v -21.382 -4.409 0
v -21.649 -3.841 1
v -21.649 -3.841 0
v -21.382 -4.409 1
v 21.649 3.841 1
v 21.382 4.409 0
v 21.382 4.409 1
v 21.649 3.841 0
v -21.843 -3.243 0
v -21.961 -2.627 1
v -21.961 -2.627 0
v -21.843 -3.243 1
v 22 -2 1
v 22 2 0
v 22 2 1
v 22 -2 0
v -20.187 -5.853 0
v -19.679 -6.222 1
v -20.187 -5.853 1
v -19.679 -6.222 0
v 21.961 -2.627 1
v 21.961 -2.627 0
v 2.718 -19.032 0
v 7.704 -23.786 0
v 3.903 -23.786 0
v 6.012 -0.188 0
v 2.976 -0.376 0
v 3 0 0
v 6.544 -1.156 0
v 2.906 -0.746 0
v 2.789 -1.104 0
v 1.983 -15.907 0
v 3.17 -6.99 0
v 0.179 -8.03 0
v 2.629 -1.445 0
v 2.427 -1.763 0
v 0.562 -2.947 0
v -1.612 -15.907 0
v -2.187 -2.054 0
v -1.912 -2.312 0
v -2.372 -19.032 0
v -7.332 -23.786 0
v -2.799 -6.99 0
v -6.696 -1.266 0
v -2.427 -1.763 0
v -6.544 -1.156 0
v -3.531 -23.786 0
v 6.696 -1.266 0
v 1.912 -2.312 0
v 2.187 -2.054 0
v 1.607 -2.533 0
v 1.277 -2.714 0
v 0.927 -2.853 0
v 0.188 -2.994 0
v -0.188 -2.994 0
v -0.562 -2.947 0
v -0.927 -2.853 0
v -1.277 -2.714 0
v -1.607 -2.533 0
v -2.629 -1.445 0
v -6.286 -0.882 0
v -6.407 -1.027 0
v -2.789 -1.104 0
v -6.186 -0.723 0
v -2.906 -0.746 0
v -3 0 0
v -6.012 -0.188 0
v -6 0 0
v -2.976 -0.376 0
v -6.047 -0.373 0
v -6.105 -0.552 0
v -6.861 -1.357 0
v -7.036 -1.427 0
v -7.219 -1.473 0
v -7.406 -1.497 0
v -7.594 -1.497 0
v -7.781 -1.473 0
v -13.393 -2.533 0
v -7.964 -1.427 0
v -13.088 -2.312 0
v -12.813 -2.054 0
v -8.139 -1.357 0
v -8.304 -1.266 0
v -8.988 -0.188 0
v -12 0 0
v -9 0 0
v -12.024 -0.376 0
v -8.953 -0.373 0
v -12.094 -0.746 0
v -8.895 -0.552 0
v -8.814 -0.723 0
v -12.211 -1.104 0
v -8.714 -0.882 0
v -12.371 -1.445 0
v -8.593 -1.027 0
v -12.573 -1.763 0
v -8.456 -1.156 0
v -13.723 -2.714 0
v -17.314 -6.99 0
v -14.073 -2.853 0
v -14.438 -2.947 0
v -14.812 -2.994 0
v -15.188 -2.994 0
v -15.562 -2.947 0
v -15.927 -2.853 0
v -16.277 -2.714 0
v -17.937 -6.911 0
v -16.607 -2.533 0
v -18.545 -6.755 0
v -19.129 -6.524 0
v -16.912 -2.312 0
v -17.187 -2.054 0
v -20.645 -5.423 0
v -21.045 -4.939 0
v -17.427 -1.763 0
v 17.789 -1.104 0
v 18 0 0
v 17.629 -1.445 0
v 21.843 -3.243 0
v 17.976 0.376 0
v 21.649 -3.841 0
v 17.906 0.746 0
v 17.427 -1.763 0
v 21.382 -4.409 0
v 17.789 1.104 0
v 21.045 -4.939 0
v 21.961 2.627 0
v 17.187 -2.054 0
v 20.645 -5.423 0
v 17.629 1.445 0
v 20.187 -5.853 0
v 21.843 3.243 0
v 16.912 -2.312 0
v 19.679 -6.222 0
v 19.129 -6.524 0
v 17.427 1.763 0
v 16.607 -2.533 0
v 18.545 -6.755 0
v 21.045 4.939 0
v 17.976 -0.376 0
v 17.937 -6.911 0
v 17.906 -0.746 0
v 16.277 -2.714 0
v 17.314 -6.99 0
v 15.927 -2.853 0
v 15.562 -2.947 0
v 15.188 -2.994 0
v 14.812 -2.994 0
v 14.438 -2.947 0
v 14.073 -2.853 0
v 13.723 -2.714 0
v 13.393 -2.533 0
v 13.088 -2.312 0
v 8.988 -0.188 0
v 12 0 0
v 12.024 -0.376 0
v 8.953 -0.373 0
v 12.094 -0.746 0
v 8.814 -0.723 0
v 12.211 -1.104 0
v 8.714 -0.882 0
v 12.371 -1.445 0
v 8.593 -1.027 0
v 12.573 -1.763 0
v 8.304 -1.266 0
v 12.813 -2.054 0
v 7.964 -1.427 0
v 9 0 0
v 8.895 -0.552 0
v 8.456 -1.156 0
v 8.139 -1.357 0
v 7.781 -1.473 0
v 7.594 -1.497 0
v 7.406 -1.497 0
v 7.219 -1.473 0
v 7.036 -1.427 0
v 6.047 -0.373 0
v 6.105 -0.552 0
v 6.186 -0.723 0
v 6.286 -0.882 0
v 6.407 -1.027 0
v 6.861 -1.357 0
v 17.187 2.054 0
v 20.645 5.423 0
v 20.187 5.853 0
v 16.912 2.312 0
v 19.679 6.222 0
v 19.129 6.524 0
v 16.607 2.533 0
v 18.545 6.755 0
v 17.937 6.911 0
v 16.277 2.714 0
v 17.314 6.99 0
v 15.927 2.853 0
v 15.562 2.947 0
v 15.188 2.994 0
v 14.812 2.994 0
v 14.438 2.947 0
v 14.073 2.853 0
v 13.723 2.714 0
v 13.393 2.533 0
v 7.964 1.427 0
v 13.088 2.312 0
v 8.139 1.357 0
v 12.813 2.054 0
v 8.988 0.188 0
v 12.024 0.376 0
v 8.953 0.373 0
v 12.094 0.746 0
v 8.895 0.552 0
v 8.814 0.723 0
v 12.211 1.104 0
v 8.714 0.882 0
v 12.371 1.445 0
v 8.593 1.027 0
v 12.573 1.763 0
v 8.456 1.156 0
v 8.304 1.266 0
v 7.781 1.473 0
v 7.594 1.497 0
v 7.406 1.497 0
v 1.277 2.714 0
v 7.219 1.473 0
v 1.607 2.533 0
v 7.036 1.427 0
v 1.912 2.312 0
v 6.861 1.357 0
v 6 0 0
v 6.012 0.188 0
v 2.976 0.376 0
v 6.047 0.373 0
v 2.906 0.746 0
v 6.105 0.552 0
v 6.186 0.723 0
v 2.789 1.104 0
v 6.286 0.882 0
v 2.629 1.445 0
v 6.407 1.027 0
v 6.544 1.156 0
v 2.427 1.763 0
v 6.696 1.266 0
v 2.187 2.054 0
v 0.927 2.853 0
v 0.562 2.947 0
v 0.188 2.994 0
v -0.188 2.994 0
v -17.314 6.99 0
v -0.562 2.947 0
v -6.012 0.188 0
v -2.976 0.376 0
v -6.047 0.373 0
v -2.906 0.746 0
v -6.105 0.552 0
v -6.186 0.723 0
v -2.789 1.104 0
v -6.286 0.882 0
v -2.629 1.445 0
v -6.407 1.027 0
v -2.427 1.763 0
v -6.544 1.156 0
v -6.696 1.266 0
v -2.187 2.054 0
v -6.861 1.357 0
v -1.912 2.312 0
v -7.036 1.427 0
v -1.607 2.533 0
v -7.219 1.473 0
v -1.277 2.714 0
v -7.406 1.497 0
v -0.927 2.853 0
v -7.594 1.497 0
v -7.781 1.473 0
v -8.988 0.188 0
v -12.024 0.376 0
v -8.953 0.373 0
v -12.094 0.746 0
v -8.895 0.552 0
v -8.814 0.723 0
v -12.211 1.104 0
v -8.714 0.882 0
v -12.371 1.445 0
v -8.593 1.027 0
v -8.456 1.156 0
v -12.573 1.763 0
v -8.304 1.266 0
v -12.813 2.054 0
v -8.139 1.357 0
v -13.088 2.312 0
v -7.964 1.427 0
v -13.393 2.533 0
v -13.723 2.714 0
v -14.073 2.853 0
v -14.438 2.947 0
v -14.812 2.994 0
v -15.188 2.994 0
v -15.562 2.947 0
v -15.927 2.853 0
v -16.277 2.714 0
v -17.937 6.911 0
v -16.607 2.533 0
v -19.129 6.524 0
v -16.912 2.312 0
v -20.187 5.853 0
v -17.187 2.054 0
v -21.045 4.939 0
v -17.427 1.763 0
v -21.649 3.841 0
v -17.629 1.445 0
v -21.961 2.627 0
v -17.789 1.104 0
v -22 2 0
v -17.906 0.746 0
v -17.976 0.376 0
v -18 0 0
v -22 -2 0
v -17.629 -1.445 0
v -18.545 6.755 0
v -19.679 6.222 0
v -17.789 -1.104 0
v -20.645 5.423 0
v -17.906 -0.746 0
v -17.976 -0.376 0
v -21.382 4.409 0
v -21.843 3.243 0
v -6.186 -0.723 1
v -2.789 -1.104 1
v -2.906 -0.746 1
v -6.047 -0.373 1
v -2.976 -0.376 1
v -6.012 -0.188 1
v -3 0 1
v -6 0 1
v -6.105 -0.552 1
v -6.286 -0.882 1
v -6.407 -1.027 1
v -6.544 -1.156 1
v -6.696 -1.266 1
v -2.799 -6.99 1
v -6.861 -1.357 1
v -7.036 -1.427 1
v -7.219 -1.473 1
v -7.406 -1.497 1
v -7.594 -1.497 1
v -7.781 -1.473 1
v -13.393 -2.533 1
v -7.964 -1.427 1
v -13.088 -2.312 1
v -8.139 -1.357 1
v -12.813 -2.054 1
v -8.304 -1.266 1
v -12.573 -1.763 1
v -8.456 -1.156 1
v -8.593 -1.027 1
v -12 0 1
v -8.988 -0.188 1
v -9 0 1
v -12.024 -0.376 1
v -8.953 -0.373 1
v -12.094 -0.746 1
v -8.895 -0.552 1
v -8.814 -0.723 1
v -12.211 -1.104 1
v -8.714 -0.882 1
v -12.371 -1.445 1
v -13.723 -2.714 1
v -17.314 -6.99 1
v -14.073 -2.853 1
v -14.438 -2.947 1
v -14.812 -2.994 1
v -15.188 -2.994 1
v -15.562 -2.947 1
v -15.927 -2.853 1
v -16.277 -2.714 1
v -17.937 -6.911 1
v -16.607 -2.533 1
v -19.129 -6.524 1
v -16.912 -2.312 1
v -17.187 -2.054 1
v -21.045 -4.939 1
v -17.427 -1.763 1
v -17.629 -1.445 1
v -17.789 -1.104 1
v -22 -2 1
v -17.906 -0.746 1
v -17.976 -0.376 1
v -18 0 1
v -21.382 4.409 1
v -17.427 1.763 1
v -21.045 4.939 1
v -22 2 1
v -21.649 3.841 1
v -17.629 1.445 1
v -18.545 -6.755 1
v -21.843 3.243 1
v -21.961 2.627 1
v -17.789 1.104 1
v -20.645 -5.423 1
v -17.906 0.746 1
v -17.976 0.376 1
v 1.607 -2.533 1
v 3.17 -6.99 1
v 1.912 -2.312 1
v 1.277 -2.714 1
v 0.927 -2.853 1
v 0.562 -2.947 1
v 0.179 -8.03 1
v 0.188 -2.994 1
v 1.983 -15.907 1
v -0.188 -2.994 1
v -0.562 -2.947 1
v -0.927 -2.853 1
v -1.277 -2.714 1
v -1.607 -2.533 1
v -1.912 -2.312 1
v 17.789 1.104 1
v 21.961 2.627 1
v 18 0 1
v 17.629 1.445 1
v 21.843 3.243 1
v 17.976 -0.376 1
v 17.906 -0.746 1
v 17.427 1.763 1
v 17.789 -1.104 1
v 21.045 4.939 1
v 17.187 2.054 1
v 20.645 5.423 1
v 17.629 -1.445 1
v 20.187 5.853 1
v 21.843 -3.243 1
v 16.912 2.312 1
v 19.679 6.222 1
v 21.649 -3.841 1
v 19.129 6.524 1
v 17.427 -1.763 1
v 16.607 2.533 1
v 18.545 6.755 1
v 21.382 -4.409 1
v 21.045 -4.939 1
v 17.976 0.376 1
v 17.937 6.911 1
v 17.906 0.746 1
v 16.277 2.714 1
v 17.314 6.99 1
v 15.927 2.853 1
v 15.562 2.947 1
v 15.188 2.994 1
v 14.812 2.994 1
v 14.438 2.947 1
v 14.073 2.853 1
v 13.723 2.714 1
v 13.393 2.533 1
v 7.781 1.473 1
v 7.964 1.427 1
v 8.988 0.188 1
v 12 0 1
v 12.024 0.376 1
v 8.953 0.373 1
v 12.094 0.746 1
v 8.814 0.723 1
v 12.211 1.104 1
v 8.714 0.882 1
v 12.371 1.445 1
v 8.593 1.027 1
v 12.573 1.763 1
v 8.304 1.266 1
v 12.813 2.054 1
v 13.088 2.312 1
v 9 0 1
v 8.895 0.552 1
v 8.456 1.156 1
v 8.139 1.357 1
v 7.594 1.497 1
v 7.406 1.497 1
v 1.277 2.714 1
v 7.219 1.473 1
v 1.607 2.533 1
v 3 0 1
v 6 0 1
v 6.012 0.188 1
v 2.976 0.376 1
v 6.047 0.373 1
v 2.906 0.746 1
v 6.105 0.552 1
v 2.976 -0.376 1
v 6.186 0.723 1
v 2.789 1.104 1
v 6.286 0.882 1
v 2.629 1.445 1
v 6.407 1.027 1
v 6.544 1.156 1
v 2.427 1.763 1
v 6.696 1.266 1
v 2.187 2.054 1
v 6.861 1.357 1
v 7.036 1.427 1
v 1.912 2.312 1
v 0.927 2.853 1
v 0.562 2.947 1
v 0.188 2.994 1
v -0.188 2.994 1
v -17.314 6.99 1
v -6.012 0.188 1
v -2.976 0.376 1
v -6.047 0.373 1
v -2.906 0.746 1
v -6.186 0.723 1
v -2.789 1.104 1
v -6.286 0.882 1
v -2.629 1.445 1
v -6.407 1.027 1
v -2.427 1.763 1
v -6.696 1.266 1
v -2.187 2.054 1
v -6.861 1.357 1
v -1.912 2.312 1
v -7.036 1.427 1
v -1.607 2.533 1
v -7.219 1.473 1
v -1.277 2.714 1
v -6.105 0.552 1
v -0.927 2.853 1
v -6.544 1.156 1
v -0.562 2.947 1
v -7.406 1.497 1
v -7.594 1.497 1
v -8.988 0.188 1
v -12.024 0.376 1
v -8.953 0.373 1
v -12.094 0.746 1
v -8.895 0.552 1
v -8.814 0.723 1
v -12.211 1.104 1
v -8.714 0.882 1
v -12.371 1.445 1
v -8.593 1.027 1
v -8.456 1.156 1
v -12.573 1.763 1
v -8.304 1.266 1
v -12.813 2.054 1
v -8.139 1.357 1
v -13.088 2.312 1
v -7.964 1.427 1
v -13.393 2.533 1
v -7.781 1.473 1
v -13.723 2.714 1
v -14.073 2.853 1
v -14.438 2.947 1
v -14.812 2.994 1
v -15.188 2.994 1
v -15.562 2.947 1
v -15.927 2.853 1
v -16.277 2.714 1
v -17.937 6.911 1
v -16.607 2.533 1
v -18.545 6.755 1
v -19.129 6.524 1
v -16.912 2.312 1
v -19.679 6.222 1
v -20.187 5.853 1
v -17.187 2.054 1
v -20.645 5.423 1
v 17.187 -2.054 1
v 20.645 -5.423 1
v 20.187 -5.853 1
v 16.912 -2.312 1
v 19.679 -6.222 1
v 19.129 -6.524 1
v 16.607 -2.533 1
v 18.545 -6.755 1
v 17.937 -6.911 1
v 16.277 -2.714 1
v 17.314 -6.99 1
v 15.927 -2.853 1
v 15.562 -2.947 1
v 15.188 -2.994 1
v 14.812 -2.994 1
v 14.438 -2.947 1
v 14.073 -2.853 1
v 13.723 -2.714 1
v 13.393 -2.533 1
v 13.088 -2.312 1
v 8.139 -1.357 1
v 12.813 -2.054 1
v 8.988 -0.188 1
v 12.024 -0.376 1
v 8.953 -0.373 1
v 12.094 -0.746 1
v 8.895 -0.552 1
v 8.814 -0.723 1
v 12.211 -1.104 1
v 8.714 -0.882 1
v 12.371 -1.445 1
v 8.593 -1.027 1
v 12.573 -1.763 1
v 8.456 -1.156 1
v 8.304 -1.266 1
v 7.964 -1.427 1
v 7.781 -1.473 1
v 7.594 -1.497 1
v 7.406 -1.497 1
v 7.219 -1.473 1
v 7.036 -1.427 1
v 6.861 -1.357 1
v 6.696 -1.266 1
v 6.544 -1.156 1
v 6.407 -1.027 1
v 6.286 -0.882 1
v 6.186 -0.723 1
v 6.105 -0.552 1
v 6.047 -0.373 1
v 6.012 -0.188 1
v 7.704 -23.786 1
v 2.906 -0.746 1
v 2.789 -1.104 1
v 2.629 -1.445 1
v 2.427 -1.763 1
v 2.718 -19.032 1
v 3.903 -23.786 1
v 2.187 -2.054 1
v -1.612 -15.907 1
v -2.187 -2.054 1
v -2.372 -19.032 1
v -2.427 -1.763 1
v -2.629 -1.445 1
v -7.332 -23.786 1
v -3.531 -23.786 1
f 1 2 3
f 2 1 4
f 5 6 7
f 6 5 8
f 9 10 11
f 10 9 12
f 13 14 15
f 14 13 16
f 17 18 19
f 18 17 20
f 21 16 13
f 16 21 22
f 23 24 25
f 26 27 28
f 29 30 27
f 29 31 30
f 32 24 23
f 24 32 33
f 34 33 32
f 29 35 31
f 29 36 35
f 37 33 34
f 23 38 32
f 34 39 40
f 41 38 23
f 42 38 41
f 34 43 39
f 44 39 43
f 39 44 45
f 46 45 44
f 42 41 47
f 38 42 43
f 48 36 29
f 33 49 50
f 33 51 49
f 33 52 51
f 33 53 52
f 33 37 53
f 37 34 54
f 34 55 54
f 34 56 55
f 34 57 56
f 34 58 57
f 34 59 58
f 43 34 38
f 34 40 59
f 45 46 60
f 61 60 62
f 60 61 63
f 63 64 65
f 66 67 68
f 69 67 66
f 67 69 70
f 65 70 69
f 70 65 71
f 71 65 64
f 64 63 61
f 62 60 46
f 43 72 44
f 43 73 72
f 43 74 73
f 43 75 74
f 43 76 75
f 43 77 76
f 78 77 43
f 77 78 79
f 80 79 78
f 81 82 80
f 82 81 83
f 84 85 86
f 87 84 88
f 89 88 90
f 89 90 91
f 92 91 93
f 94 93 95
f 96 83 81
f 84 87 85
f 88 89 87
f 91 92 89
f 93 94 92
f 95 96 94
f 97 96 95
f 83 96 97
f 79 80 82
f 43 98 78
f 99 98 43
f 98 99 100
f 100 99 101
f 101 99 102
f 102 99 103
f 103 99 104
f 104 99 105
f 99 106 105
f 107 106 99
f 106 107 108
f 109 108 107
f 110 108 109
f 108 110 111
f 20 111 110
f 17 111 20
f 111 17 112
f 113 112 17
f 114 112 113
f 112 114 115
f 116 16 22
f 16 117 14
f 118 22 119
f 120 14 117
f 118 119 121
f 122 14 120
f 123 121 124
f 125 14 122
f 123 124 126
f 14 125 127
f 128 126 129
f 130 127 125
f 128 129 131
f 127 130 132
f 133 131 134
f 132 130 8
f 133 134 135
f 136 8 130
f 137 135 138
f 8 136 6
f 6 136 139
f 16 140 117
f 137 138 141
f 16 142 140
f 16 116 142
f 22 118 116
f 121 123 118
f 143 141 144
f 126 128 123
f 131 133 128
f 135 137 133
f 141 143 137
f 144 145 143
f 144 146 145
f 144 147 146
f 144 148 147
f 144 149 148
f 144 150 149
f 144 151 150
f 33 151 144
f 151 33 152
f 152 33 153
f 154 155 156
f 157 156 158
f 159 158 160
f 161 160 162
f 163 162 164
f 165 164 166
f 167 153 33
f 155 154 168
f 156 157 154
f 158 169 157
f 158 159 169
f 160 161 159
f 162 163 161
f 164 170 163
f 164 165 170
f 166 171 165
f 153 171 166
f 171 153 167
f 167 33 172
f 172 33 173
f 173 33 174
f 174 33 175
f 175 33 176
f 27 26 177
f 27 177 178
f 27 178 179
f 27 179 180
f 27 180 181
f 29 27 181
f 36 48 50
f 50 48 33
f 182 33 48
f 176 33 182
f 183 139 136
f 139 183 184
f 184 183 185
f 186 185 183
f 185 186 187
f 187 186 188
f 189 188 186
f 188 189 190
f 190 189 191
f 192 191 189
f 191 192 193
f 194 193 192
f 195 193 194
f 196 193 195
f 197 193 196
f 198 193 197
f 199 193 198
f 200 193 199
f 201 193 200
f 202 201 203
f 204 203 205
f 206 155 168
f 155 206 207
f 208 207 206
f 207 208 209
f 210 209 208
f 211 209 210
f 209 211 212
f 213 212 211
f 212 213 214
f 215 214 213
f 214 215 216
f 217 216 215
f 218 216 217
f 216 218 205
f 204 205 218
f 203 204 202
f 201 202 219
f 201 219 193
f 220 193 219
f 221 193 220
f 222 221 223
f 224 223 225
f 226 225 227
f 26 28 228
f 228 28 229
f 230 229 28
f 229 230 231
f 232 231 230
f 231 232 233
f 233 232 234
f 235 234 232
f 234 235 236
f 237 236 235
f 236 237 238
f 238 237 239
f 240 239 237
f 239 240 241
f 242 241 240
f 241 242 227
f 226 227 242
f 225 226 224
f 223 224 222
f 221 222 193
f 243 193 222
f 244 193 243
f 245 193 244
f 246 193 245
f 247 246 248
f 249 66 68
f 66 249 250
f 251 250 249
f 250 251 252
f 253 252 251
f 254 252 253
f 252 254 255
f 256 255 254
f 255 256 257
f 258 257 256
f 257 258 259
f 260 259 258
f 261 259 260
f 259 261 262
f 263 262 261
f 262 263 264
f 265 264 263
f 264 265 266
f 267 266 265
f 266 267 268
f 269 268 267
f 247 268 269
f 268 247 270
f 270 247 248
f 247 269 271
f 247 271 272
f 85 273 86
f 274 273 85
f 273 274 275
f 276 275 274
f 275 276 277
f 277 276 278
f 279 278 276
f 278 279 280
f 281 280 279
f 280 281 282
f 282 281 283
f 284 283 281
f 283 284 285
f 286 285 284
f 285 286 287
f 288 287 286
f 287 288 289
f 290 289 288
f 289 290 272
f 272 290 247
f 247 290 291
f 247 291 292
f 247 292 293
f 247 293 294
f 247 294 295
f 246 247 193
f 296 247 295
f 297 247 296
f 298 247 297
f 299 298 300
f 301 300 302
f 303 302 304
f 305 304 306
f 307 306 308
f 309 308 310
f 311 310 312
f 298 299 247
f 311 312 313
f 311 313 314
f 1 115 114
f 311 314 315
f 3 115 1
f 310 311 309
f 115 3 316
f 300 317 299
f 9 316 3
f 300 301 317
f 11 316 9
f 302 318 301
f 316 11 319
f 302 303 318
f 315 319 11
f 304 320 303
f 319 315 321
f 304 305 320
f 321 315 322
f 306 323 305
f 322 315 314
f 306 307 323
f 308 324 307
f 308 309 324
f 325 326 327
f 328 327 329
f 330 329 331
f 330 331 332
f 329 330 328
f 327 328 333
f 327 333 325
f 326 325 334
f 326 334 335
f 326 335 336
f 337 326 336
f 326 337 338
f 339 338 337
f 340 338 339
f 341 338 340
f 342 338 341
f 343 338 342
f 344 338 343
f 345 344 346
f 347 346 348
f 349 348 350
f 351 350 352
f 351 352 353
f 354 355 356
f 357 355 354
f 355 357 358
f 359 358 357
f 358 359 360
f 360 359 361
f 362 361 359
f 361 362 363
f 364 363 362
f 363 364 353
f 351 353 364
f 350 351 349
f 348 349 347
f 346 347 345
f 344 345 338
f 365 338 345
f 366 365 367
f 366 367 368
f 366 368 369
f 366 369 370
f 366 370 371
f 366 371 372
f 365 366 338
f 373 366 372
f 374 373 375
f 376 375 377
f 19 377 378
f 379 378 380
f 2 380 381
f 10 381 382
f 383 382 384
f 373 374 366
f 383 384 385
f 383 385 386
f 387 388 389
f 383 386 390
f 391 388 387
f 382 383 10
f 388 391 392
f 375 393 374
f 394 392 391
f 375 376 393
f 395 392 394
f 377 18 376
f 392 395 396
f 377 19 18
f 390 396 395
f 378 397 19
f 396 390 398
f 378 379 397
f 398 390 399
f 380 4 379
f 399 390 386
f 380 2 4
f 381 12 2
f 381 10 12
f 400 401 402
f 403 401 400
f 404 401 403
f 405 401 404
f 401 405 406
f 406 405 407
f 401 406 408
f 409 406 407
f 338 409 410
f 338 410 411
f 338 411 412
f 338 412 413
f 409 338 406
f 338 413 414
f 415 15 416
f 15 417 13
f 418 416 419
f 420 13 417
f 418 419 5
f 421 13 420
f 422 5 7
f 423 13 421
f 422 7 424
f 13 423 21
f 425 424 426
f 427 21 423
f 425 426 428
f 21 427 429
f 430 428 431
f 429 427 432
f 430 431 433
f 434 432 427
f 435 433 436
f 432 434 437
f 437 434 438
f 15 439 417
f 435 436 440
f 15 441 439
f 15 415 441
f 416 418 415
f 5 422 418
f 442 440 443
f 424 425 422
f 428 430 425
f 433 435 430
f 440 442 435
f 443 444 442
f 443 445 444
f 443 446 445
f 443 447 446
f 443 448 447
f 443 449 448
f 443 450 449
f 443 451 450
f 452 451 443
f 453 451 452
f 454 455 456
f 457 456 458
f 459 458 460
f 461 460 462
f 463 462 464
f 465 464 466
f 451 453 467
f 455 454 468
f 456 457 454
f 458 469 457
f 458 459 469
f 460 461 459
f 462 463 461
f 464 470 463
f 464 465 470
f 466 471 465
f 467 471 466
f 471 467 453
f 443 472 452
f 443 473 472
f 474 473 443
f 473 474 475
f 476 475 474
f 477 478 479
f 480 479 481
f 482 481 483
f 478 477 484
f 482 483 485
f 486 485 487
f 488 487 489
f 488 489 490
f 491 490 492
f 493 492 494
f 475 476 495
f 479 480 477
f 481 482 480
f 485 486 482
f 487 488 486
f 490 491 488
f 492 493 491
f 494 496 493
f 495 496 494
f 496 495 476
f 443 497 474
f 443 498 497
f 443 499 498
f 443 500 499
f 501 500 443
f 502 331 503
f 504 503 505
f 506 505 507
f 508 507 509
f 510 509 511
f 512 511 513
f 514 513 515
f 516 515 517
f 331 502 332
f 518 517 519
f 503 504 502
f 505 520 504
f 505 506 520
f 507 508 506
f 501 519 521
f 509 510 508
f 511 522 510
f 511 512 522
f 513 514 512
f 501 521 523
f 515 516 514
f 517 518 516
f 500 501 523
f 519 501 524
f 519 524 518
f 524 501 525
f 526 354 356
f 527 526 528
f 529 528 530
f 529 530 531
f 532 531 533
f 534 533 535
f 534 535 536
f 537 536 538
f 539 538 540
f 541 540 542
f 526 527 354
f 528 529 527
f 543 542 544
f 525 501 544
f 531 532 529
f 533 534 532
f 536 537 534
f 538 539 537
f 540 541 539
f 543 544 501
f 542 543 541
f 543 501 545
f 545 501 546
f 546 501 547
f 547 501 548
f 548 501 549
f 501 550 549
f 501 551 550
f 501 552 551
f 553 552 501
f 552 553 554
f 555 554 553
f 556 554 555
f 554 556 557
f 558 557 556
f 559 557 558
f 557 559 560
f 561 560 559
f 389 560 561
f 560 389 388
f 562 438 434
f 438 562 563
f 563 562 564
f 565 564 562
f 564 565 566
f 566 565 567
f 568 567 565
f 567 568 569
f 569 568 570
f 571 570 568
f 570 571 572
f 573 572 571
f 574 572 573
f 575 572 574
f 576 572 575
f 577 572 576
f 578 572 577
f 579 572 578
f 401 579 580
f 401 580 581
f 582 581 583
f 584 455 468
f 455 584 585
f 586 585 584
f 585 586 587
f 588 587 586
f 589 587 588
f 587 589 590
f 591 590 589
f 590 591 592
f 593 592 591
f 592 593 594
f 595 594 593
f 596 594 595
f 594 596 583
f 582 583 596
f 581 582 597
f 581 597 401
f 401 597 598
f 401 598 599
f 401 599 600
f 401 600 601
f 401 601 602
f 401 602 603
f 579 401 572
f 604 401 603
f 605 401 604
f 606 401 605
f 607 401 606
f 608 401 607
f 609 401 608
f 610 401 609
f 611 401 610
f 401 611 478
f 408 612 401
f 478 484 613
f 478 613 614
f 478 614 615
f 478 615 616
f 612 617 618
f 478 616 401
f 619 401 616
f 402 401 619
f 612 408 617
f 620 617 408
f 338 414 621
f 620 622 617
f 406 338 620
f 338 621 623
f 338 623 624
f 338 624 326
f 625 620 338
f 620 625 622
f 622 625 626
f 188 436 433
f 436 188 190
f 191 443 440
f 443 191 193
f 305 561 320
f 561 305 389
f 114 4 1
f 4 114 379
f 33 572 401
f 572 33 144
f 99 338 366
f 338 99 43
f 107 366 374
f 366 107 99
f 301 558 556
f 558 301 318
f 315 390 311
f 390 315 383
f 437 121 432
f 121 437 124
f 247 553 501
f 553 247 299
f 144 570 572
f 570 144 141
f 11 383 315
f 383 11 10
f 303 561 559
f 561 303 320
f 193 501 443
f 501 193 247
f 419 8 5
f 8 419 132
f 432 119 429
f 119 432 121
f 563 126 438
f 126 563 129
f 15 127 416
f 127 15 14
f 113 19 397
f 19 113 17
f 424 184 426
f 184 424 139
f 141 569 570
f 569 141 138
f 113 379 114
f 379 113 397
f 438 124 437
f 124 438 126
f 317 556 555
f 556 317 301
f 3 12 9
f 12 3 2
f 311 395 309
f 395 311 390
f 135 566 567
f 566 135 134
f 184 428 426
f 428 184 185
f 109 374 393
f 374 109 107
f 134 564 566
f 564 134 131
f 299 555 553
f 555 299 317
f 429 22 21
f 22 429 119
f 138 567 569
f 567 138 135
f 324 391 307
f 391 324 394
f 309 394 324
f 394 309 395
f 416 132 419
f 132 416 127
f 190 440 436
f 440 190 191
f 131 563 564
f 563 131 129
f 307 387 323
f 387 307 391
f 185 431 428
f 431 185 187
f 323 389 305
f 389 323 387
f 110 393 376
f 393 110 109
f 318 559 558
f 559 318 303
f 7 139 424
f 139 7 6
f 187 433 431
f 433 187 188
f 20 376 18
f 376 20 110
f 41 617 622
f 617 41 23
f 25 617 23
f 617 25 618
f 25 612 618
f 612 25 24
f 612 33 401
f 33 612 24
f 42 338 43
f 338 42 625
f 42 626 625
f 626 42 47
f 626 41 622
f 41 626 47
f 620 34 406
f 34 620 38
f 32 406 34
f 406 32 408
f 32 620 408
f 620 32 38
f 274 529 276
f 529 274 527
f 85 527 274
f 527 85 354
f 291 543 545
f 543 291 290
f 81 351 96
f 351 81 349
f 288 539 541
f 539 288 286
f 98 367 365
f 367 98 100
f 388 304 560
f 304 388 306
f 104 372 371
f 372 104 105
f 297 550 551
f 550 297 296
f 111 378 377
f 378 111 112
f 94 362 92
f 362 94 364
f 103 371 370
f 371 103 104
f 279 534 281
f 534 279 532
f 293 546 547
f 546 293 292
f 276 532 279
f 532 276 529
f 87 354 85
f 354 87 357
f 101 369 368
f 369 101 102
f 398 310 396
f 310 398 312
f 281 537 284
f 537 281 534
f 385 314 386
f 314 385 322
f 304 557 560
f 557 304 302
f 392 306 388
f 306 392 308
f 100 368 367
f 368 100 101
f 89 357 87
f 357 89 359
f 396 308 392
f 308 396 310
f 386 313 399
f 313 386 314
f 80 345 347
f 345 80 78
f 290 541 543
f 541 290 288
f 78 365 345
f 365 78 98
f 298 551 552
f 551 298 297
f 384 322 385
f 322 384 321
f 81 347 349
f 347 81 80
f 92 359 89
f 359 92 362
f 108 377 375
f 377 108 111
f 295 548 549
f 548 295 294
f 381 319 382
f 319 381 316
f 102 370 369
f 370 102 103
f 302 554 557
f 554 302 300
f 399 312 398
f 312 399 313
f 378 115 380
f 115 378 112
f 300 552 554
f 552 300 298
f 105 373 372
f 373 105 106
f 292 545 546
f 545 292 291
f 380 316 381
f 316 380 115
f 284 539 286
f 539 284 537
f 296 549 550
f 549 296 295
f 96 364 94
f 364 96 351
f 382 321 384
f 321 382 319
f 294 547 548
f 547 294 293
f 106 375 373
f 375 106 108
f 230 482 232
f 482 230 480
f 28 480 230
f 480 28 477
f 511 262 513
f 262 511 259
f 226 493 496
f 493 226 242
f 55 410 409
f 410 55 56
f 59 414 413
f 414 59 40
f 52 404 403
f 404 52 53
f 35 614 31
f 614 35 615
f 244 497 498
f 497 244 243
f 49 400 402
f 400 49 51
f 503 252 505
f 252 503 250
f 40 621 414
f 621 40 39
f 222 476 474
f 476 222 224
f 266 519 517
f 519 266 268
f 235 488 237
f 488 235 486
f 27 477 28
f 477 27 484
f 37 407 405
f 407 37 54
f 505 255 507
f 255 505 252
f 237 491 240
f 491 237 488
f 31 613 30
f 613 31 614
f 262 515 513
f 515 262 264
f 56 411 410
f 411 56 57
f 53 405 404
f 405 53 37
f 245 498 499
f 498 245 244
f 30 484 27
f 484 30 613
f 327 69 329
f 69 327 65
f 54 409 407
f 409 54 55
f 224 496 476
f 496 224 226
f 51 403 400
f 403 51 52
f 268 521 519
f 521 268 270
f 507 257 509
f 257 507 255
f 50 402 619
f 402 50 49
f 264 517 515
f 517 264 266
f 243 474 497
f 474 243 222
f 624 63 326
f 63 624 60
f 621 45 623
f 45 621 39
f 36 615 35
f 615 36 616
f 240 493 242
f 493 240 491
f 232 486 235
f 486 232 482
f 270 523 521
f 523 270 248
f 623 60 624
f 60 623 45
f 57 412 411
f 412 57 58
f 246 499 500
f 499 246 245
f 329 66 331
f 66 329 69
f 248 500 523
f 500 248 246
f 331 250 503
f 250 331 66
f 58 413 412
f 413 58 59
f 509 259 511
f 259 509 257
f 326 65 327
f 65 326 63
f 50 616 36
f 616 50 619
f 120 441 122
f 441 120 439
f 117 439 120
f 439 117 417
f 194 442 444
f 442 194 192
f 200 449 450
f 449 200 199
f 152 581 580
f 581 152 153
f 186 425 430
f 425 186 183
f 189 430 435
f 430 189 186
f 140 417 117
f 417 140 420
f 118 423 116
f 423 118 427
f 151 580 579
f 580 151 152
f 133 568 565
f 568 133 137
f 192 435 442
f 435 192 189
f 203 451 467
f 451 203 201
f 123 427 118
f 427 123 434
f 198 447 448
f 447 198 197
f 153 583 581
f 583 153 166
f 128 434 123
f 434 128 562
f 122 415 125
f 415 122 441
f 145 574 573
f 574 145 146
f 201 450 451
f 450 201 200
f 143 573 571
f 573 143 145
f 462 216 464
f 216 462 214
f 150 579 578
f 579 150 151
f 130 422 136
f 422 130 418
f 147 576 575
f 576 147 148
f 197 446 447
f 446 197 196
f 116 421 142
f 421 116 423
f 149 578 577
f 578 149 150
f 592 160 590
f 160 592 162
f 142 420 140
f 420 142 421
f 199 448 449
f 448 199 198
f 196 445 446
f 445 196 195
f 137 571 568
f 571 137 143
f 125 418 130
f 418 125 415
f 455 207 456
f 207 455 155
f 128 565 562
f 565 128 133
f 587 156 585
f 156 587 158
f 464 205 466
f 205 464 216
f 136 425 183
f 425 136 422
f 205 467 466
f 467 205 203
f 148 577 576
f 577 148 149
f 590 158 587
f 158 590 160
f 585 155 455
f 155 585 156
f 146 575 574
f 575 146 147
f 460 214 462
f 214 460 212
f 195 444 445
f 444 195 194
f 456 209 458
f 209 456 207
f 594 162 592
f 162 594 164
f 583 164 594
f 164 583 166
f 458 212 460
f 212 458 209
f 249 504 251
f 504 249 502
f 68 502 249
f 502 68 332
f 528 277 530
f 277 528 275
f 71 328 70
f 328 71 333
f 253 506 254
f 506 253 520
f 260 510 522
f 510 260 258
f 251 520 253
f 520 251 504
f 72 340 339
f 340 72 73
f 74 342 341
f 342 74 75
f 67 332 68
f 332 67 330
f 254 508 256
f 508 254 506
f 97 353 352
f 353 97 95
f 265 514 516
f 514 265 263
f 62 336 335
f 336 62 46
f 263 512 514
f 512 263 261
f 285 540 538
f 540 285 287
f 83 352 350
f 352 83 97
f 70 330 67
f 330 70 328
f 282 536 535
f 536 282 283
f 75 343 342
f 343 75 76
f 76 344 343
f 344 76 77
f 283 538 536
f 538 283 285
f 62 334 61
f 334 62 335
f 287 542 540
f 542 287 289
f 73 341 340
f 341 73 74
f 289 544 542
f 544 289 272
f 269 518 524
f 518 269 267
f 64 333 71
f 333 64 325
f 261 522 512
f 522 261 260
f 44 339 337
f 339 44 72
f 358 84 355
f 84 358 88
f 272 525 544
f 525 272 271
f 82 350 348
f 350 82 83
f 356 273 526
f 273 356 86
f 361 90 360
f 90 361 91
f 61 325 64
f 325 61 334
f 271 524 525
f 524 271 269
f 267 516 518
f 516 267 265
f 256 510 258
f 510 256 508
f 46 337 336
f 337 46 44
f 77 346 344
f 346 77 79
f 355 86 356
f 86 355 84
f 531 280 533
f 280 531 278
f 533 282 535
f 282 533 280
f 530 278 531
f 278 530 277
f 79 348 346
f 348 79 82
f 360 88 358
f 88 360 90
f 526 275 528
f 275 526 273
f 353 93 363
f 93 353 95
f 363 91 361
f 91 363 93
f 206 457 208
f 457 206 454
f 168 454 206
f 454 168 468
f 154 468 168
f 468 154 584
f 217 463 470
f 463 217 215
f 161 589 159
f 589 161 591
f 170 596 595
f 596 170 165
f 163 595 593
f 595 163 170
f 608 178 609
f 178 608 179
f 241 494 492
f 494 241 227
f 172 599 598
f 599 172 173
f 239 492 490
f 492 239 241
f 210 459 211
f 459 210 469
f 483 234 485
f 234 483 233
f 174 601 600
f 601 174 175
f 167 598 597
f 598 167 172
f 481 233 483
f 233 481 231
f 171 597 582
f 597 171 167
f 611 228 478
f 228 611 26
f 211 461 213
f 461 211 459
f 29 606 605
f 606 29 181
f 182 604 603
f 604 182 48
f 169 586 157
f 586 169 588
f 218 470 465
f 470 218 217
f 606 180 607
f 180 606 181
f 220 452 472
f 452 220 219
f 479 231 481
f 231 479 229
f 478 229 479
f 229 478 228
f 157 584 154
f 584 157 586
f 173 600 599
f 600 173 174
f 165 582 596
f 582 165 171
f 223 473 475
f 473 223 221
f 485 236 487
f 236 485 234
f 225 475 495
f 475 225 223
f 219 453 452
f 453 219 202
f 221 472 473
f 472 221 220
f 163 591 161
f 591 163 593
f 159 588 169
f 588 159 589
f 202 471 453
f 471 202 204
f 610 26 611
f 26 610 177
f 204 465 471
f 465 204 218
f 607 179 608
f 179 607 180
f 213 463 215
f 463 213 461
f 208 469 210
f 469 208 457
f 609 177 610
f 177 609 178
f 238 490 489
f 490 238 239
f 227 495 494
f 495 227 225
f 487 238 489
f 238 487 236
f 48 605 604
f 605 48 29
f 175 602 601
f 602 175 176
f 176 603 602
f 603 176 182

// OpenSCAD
$fn = 50;


difference() {
	union() {
		*color(alpha = 1.0000000000, c = "gray") {
			translate(v = [0, 14, 0]) {
				linear_extrude(height = 1) {
					text(font = "Arial:style=Bold", halign = "center", size = 4.5000000000, text = "COMMENT description oobb_plate_shape_p_type_1_depth_3_width_1_thickness_a_extra_oobb_size", valign = "center");
				}
			}
		}
		hull() {
			translate(v = [-17.0000000000, 2.0000000000, 0]) {
				cylinder(h = 1, r = 5);
			}
			translate(v = [17.0000000000, 2.0000000000, 0]) {
				cylinder(h = 1, r = 5);
			}
			translate(v = [-17.0000000000, -2.0000000000, 0]) {
				cylinder(h = 1, r = 5);
			}
			translate(v = [17.0000000000, -2.0000000000, 0]) {
				cylinder(h = 1, r = 5);
			}
		}
		translate(v = [0, -5, 0]) {
			linear_extrude(height = 1) {
				text(font = "DejaVu Sans Mono:style=Bold", halign = "center", size = 19.0000000000, text = "A", valign = "top");
			}
		}
	}
	union() {
		*color(alpha = 1.0000000000, c = "gray") {
			translate(v = [0, 14, 0]) {
				linear_extrude(height = 1) {
					text(font = "Arial:style=Bold", halign = "center", size = 4.5000000000, text = "COMMENT description oobb_holes_shape_n_type_3_width_1_thickness_a_extra_oobb_size_1_height_'all'_holes_true_both_holes", valign = "center");
				}
			}
		}
		translate(v = [-15.0000000000, 0.0000000000, 0]) {
			translate(v = [0, 0, -50]) {
				cylinder(h = 100, r = 3.0000000000);
			}
		}
		translate(v = [0, 0, -50]) {
			cylinder(h = 100, r = 3.0000000000);
		}
		translate(v = [15.0000000000, 0.0000000000, 0]) {
			translate(v = [0, 0, -50]) {
				cylinder(h = 100, r = 3.0000000000);
			}
		}
		translate(v = [-15.0000000000, 0.0000000000, 0]) {
			translate(v = [0, 0, -50]) {
				cylinder(h = 100, r = 1.5000000000);
			}
		}
		translate(v = [-7.5000000000, 0.0000000000, 0]) {
			translate(v = [0, 0, -50]) {
				cylinder(h = 100, r = 1.5000000000);
			}
		}
		translate(v = [0, 0, -50]) {
			cylinder(h = 100, r = 1.5000000000);
		}
		translate(v = [7.5000000000, 0.0000000000, 0]) {
			translate(v = [0, 0, -50]) {
				cylinder(h = 100, r = 1.5000000000);
			}
		}
		translate(v = [15.0000000000, 0.0000000000, 0]) {
			translate(v = [0, 0, -50]) {
				cylinder(h = 100, r = 1.5000000000);
			}
		}
	}
}
